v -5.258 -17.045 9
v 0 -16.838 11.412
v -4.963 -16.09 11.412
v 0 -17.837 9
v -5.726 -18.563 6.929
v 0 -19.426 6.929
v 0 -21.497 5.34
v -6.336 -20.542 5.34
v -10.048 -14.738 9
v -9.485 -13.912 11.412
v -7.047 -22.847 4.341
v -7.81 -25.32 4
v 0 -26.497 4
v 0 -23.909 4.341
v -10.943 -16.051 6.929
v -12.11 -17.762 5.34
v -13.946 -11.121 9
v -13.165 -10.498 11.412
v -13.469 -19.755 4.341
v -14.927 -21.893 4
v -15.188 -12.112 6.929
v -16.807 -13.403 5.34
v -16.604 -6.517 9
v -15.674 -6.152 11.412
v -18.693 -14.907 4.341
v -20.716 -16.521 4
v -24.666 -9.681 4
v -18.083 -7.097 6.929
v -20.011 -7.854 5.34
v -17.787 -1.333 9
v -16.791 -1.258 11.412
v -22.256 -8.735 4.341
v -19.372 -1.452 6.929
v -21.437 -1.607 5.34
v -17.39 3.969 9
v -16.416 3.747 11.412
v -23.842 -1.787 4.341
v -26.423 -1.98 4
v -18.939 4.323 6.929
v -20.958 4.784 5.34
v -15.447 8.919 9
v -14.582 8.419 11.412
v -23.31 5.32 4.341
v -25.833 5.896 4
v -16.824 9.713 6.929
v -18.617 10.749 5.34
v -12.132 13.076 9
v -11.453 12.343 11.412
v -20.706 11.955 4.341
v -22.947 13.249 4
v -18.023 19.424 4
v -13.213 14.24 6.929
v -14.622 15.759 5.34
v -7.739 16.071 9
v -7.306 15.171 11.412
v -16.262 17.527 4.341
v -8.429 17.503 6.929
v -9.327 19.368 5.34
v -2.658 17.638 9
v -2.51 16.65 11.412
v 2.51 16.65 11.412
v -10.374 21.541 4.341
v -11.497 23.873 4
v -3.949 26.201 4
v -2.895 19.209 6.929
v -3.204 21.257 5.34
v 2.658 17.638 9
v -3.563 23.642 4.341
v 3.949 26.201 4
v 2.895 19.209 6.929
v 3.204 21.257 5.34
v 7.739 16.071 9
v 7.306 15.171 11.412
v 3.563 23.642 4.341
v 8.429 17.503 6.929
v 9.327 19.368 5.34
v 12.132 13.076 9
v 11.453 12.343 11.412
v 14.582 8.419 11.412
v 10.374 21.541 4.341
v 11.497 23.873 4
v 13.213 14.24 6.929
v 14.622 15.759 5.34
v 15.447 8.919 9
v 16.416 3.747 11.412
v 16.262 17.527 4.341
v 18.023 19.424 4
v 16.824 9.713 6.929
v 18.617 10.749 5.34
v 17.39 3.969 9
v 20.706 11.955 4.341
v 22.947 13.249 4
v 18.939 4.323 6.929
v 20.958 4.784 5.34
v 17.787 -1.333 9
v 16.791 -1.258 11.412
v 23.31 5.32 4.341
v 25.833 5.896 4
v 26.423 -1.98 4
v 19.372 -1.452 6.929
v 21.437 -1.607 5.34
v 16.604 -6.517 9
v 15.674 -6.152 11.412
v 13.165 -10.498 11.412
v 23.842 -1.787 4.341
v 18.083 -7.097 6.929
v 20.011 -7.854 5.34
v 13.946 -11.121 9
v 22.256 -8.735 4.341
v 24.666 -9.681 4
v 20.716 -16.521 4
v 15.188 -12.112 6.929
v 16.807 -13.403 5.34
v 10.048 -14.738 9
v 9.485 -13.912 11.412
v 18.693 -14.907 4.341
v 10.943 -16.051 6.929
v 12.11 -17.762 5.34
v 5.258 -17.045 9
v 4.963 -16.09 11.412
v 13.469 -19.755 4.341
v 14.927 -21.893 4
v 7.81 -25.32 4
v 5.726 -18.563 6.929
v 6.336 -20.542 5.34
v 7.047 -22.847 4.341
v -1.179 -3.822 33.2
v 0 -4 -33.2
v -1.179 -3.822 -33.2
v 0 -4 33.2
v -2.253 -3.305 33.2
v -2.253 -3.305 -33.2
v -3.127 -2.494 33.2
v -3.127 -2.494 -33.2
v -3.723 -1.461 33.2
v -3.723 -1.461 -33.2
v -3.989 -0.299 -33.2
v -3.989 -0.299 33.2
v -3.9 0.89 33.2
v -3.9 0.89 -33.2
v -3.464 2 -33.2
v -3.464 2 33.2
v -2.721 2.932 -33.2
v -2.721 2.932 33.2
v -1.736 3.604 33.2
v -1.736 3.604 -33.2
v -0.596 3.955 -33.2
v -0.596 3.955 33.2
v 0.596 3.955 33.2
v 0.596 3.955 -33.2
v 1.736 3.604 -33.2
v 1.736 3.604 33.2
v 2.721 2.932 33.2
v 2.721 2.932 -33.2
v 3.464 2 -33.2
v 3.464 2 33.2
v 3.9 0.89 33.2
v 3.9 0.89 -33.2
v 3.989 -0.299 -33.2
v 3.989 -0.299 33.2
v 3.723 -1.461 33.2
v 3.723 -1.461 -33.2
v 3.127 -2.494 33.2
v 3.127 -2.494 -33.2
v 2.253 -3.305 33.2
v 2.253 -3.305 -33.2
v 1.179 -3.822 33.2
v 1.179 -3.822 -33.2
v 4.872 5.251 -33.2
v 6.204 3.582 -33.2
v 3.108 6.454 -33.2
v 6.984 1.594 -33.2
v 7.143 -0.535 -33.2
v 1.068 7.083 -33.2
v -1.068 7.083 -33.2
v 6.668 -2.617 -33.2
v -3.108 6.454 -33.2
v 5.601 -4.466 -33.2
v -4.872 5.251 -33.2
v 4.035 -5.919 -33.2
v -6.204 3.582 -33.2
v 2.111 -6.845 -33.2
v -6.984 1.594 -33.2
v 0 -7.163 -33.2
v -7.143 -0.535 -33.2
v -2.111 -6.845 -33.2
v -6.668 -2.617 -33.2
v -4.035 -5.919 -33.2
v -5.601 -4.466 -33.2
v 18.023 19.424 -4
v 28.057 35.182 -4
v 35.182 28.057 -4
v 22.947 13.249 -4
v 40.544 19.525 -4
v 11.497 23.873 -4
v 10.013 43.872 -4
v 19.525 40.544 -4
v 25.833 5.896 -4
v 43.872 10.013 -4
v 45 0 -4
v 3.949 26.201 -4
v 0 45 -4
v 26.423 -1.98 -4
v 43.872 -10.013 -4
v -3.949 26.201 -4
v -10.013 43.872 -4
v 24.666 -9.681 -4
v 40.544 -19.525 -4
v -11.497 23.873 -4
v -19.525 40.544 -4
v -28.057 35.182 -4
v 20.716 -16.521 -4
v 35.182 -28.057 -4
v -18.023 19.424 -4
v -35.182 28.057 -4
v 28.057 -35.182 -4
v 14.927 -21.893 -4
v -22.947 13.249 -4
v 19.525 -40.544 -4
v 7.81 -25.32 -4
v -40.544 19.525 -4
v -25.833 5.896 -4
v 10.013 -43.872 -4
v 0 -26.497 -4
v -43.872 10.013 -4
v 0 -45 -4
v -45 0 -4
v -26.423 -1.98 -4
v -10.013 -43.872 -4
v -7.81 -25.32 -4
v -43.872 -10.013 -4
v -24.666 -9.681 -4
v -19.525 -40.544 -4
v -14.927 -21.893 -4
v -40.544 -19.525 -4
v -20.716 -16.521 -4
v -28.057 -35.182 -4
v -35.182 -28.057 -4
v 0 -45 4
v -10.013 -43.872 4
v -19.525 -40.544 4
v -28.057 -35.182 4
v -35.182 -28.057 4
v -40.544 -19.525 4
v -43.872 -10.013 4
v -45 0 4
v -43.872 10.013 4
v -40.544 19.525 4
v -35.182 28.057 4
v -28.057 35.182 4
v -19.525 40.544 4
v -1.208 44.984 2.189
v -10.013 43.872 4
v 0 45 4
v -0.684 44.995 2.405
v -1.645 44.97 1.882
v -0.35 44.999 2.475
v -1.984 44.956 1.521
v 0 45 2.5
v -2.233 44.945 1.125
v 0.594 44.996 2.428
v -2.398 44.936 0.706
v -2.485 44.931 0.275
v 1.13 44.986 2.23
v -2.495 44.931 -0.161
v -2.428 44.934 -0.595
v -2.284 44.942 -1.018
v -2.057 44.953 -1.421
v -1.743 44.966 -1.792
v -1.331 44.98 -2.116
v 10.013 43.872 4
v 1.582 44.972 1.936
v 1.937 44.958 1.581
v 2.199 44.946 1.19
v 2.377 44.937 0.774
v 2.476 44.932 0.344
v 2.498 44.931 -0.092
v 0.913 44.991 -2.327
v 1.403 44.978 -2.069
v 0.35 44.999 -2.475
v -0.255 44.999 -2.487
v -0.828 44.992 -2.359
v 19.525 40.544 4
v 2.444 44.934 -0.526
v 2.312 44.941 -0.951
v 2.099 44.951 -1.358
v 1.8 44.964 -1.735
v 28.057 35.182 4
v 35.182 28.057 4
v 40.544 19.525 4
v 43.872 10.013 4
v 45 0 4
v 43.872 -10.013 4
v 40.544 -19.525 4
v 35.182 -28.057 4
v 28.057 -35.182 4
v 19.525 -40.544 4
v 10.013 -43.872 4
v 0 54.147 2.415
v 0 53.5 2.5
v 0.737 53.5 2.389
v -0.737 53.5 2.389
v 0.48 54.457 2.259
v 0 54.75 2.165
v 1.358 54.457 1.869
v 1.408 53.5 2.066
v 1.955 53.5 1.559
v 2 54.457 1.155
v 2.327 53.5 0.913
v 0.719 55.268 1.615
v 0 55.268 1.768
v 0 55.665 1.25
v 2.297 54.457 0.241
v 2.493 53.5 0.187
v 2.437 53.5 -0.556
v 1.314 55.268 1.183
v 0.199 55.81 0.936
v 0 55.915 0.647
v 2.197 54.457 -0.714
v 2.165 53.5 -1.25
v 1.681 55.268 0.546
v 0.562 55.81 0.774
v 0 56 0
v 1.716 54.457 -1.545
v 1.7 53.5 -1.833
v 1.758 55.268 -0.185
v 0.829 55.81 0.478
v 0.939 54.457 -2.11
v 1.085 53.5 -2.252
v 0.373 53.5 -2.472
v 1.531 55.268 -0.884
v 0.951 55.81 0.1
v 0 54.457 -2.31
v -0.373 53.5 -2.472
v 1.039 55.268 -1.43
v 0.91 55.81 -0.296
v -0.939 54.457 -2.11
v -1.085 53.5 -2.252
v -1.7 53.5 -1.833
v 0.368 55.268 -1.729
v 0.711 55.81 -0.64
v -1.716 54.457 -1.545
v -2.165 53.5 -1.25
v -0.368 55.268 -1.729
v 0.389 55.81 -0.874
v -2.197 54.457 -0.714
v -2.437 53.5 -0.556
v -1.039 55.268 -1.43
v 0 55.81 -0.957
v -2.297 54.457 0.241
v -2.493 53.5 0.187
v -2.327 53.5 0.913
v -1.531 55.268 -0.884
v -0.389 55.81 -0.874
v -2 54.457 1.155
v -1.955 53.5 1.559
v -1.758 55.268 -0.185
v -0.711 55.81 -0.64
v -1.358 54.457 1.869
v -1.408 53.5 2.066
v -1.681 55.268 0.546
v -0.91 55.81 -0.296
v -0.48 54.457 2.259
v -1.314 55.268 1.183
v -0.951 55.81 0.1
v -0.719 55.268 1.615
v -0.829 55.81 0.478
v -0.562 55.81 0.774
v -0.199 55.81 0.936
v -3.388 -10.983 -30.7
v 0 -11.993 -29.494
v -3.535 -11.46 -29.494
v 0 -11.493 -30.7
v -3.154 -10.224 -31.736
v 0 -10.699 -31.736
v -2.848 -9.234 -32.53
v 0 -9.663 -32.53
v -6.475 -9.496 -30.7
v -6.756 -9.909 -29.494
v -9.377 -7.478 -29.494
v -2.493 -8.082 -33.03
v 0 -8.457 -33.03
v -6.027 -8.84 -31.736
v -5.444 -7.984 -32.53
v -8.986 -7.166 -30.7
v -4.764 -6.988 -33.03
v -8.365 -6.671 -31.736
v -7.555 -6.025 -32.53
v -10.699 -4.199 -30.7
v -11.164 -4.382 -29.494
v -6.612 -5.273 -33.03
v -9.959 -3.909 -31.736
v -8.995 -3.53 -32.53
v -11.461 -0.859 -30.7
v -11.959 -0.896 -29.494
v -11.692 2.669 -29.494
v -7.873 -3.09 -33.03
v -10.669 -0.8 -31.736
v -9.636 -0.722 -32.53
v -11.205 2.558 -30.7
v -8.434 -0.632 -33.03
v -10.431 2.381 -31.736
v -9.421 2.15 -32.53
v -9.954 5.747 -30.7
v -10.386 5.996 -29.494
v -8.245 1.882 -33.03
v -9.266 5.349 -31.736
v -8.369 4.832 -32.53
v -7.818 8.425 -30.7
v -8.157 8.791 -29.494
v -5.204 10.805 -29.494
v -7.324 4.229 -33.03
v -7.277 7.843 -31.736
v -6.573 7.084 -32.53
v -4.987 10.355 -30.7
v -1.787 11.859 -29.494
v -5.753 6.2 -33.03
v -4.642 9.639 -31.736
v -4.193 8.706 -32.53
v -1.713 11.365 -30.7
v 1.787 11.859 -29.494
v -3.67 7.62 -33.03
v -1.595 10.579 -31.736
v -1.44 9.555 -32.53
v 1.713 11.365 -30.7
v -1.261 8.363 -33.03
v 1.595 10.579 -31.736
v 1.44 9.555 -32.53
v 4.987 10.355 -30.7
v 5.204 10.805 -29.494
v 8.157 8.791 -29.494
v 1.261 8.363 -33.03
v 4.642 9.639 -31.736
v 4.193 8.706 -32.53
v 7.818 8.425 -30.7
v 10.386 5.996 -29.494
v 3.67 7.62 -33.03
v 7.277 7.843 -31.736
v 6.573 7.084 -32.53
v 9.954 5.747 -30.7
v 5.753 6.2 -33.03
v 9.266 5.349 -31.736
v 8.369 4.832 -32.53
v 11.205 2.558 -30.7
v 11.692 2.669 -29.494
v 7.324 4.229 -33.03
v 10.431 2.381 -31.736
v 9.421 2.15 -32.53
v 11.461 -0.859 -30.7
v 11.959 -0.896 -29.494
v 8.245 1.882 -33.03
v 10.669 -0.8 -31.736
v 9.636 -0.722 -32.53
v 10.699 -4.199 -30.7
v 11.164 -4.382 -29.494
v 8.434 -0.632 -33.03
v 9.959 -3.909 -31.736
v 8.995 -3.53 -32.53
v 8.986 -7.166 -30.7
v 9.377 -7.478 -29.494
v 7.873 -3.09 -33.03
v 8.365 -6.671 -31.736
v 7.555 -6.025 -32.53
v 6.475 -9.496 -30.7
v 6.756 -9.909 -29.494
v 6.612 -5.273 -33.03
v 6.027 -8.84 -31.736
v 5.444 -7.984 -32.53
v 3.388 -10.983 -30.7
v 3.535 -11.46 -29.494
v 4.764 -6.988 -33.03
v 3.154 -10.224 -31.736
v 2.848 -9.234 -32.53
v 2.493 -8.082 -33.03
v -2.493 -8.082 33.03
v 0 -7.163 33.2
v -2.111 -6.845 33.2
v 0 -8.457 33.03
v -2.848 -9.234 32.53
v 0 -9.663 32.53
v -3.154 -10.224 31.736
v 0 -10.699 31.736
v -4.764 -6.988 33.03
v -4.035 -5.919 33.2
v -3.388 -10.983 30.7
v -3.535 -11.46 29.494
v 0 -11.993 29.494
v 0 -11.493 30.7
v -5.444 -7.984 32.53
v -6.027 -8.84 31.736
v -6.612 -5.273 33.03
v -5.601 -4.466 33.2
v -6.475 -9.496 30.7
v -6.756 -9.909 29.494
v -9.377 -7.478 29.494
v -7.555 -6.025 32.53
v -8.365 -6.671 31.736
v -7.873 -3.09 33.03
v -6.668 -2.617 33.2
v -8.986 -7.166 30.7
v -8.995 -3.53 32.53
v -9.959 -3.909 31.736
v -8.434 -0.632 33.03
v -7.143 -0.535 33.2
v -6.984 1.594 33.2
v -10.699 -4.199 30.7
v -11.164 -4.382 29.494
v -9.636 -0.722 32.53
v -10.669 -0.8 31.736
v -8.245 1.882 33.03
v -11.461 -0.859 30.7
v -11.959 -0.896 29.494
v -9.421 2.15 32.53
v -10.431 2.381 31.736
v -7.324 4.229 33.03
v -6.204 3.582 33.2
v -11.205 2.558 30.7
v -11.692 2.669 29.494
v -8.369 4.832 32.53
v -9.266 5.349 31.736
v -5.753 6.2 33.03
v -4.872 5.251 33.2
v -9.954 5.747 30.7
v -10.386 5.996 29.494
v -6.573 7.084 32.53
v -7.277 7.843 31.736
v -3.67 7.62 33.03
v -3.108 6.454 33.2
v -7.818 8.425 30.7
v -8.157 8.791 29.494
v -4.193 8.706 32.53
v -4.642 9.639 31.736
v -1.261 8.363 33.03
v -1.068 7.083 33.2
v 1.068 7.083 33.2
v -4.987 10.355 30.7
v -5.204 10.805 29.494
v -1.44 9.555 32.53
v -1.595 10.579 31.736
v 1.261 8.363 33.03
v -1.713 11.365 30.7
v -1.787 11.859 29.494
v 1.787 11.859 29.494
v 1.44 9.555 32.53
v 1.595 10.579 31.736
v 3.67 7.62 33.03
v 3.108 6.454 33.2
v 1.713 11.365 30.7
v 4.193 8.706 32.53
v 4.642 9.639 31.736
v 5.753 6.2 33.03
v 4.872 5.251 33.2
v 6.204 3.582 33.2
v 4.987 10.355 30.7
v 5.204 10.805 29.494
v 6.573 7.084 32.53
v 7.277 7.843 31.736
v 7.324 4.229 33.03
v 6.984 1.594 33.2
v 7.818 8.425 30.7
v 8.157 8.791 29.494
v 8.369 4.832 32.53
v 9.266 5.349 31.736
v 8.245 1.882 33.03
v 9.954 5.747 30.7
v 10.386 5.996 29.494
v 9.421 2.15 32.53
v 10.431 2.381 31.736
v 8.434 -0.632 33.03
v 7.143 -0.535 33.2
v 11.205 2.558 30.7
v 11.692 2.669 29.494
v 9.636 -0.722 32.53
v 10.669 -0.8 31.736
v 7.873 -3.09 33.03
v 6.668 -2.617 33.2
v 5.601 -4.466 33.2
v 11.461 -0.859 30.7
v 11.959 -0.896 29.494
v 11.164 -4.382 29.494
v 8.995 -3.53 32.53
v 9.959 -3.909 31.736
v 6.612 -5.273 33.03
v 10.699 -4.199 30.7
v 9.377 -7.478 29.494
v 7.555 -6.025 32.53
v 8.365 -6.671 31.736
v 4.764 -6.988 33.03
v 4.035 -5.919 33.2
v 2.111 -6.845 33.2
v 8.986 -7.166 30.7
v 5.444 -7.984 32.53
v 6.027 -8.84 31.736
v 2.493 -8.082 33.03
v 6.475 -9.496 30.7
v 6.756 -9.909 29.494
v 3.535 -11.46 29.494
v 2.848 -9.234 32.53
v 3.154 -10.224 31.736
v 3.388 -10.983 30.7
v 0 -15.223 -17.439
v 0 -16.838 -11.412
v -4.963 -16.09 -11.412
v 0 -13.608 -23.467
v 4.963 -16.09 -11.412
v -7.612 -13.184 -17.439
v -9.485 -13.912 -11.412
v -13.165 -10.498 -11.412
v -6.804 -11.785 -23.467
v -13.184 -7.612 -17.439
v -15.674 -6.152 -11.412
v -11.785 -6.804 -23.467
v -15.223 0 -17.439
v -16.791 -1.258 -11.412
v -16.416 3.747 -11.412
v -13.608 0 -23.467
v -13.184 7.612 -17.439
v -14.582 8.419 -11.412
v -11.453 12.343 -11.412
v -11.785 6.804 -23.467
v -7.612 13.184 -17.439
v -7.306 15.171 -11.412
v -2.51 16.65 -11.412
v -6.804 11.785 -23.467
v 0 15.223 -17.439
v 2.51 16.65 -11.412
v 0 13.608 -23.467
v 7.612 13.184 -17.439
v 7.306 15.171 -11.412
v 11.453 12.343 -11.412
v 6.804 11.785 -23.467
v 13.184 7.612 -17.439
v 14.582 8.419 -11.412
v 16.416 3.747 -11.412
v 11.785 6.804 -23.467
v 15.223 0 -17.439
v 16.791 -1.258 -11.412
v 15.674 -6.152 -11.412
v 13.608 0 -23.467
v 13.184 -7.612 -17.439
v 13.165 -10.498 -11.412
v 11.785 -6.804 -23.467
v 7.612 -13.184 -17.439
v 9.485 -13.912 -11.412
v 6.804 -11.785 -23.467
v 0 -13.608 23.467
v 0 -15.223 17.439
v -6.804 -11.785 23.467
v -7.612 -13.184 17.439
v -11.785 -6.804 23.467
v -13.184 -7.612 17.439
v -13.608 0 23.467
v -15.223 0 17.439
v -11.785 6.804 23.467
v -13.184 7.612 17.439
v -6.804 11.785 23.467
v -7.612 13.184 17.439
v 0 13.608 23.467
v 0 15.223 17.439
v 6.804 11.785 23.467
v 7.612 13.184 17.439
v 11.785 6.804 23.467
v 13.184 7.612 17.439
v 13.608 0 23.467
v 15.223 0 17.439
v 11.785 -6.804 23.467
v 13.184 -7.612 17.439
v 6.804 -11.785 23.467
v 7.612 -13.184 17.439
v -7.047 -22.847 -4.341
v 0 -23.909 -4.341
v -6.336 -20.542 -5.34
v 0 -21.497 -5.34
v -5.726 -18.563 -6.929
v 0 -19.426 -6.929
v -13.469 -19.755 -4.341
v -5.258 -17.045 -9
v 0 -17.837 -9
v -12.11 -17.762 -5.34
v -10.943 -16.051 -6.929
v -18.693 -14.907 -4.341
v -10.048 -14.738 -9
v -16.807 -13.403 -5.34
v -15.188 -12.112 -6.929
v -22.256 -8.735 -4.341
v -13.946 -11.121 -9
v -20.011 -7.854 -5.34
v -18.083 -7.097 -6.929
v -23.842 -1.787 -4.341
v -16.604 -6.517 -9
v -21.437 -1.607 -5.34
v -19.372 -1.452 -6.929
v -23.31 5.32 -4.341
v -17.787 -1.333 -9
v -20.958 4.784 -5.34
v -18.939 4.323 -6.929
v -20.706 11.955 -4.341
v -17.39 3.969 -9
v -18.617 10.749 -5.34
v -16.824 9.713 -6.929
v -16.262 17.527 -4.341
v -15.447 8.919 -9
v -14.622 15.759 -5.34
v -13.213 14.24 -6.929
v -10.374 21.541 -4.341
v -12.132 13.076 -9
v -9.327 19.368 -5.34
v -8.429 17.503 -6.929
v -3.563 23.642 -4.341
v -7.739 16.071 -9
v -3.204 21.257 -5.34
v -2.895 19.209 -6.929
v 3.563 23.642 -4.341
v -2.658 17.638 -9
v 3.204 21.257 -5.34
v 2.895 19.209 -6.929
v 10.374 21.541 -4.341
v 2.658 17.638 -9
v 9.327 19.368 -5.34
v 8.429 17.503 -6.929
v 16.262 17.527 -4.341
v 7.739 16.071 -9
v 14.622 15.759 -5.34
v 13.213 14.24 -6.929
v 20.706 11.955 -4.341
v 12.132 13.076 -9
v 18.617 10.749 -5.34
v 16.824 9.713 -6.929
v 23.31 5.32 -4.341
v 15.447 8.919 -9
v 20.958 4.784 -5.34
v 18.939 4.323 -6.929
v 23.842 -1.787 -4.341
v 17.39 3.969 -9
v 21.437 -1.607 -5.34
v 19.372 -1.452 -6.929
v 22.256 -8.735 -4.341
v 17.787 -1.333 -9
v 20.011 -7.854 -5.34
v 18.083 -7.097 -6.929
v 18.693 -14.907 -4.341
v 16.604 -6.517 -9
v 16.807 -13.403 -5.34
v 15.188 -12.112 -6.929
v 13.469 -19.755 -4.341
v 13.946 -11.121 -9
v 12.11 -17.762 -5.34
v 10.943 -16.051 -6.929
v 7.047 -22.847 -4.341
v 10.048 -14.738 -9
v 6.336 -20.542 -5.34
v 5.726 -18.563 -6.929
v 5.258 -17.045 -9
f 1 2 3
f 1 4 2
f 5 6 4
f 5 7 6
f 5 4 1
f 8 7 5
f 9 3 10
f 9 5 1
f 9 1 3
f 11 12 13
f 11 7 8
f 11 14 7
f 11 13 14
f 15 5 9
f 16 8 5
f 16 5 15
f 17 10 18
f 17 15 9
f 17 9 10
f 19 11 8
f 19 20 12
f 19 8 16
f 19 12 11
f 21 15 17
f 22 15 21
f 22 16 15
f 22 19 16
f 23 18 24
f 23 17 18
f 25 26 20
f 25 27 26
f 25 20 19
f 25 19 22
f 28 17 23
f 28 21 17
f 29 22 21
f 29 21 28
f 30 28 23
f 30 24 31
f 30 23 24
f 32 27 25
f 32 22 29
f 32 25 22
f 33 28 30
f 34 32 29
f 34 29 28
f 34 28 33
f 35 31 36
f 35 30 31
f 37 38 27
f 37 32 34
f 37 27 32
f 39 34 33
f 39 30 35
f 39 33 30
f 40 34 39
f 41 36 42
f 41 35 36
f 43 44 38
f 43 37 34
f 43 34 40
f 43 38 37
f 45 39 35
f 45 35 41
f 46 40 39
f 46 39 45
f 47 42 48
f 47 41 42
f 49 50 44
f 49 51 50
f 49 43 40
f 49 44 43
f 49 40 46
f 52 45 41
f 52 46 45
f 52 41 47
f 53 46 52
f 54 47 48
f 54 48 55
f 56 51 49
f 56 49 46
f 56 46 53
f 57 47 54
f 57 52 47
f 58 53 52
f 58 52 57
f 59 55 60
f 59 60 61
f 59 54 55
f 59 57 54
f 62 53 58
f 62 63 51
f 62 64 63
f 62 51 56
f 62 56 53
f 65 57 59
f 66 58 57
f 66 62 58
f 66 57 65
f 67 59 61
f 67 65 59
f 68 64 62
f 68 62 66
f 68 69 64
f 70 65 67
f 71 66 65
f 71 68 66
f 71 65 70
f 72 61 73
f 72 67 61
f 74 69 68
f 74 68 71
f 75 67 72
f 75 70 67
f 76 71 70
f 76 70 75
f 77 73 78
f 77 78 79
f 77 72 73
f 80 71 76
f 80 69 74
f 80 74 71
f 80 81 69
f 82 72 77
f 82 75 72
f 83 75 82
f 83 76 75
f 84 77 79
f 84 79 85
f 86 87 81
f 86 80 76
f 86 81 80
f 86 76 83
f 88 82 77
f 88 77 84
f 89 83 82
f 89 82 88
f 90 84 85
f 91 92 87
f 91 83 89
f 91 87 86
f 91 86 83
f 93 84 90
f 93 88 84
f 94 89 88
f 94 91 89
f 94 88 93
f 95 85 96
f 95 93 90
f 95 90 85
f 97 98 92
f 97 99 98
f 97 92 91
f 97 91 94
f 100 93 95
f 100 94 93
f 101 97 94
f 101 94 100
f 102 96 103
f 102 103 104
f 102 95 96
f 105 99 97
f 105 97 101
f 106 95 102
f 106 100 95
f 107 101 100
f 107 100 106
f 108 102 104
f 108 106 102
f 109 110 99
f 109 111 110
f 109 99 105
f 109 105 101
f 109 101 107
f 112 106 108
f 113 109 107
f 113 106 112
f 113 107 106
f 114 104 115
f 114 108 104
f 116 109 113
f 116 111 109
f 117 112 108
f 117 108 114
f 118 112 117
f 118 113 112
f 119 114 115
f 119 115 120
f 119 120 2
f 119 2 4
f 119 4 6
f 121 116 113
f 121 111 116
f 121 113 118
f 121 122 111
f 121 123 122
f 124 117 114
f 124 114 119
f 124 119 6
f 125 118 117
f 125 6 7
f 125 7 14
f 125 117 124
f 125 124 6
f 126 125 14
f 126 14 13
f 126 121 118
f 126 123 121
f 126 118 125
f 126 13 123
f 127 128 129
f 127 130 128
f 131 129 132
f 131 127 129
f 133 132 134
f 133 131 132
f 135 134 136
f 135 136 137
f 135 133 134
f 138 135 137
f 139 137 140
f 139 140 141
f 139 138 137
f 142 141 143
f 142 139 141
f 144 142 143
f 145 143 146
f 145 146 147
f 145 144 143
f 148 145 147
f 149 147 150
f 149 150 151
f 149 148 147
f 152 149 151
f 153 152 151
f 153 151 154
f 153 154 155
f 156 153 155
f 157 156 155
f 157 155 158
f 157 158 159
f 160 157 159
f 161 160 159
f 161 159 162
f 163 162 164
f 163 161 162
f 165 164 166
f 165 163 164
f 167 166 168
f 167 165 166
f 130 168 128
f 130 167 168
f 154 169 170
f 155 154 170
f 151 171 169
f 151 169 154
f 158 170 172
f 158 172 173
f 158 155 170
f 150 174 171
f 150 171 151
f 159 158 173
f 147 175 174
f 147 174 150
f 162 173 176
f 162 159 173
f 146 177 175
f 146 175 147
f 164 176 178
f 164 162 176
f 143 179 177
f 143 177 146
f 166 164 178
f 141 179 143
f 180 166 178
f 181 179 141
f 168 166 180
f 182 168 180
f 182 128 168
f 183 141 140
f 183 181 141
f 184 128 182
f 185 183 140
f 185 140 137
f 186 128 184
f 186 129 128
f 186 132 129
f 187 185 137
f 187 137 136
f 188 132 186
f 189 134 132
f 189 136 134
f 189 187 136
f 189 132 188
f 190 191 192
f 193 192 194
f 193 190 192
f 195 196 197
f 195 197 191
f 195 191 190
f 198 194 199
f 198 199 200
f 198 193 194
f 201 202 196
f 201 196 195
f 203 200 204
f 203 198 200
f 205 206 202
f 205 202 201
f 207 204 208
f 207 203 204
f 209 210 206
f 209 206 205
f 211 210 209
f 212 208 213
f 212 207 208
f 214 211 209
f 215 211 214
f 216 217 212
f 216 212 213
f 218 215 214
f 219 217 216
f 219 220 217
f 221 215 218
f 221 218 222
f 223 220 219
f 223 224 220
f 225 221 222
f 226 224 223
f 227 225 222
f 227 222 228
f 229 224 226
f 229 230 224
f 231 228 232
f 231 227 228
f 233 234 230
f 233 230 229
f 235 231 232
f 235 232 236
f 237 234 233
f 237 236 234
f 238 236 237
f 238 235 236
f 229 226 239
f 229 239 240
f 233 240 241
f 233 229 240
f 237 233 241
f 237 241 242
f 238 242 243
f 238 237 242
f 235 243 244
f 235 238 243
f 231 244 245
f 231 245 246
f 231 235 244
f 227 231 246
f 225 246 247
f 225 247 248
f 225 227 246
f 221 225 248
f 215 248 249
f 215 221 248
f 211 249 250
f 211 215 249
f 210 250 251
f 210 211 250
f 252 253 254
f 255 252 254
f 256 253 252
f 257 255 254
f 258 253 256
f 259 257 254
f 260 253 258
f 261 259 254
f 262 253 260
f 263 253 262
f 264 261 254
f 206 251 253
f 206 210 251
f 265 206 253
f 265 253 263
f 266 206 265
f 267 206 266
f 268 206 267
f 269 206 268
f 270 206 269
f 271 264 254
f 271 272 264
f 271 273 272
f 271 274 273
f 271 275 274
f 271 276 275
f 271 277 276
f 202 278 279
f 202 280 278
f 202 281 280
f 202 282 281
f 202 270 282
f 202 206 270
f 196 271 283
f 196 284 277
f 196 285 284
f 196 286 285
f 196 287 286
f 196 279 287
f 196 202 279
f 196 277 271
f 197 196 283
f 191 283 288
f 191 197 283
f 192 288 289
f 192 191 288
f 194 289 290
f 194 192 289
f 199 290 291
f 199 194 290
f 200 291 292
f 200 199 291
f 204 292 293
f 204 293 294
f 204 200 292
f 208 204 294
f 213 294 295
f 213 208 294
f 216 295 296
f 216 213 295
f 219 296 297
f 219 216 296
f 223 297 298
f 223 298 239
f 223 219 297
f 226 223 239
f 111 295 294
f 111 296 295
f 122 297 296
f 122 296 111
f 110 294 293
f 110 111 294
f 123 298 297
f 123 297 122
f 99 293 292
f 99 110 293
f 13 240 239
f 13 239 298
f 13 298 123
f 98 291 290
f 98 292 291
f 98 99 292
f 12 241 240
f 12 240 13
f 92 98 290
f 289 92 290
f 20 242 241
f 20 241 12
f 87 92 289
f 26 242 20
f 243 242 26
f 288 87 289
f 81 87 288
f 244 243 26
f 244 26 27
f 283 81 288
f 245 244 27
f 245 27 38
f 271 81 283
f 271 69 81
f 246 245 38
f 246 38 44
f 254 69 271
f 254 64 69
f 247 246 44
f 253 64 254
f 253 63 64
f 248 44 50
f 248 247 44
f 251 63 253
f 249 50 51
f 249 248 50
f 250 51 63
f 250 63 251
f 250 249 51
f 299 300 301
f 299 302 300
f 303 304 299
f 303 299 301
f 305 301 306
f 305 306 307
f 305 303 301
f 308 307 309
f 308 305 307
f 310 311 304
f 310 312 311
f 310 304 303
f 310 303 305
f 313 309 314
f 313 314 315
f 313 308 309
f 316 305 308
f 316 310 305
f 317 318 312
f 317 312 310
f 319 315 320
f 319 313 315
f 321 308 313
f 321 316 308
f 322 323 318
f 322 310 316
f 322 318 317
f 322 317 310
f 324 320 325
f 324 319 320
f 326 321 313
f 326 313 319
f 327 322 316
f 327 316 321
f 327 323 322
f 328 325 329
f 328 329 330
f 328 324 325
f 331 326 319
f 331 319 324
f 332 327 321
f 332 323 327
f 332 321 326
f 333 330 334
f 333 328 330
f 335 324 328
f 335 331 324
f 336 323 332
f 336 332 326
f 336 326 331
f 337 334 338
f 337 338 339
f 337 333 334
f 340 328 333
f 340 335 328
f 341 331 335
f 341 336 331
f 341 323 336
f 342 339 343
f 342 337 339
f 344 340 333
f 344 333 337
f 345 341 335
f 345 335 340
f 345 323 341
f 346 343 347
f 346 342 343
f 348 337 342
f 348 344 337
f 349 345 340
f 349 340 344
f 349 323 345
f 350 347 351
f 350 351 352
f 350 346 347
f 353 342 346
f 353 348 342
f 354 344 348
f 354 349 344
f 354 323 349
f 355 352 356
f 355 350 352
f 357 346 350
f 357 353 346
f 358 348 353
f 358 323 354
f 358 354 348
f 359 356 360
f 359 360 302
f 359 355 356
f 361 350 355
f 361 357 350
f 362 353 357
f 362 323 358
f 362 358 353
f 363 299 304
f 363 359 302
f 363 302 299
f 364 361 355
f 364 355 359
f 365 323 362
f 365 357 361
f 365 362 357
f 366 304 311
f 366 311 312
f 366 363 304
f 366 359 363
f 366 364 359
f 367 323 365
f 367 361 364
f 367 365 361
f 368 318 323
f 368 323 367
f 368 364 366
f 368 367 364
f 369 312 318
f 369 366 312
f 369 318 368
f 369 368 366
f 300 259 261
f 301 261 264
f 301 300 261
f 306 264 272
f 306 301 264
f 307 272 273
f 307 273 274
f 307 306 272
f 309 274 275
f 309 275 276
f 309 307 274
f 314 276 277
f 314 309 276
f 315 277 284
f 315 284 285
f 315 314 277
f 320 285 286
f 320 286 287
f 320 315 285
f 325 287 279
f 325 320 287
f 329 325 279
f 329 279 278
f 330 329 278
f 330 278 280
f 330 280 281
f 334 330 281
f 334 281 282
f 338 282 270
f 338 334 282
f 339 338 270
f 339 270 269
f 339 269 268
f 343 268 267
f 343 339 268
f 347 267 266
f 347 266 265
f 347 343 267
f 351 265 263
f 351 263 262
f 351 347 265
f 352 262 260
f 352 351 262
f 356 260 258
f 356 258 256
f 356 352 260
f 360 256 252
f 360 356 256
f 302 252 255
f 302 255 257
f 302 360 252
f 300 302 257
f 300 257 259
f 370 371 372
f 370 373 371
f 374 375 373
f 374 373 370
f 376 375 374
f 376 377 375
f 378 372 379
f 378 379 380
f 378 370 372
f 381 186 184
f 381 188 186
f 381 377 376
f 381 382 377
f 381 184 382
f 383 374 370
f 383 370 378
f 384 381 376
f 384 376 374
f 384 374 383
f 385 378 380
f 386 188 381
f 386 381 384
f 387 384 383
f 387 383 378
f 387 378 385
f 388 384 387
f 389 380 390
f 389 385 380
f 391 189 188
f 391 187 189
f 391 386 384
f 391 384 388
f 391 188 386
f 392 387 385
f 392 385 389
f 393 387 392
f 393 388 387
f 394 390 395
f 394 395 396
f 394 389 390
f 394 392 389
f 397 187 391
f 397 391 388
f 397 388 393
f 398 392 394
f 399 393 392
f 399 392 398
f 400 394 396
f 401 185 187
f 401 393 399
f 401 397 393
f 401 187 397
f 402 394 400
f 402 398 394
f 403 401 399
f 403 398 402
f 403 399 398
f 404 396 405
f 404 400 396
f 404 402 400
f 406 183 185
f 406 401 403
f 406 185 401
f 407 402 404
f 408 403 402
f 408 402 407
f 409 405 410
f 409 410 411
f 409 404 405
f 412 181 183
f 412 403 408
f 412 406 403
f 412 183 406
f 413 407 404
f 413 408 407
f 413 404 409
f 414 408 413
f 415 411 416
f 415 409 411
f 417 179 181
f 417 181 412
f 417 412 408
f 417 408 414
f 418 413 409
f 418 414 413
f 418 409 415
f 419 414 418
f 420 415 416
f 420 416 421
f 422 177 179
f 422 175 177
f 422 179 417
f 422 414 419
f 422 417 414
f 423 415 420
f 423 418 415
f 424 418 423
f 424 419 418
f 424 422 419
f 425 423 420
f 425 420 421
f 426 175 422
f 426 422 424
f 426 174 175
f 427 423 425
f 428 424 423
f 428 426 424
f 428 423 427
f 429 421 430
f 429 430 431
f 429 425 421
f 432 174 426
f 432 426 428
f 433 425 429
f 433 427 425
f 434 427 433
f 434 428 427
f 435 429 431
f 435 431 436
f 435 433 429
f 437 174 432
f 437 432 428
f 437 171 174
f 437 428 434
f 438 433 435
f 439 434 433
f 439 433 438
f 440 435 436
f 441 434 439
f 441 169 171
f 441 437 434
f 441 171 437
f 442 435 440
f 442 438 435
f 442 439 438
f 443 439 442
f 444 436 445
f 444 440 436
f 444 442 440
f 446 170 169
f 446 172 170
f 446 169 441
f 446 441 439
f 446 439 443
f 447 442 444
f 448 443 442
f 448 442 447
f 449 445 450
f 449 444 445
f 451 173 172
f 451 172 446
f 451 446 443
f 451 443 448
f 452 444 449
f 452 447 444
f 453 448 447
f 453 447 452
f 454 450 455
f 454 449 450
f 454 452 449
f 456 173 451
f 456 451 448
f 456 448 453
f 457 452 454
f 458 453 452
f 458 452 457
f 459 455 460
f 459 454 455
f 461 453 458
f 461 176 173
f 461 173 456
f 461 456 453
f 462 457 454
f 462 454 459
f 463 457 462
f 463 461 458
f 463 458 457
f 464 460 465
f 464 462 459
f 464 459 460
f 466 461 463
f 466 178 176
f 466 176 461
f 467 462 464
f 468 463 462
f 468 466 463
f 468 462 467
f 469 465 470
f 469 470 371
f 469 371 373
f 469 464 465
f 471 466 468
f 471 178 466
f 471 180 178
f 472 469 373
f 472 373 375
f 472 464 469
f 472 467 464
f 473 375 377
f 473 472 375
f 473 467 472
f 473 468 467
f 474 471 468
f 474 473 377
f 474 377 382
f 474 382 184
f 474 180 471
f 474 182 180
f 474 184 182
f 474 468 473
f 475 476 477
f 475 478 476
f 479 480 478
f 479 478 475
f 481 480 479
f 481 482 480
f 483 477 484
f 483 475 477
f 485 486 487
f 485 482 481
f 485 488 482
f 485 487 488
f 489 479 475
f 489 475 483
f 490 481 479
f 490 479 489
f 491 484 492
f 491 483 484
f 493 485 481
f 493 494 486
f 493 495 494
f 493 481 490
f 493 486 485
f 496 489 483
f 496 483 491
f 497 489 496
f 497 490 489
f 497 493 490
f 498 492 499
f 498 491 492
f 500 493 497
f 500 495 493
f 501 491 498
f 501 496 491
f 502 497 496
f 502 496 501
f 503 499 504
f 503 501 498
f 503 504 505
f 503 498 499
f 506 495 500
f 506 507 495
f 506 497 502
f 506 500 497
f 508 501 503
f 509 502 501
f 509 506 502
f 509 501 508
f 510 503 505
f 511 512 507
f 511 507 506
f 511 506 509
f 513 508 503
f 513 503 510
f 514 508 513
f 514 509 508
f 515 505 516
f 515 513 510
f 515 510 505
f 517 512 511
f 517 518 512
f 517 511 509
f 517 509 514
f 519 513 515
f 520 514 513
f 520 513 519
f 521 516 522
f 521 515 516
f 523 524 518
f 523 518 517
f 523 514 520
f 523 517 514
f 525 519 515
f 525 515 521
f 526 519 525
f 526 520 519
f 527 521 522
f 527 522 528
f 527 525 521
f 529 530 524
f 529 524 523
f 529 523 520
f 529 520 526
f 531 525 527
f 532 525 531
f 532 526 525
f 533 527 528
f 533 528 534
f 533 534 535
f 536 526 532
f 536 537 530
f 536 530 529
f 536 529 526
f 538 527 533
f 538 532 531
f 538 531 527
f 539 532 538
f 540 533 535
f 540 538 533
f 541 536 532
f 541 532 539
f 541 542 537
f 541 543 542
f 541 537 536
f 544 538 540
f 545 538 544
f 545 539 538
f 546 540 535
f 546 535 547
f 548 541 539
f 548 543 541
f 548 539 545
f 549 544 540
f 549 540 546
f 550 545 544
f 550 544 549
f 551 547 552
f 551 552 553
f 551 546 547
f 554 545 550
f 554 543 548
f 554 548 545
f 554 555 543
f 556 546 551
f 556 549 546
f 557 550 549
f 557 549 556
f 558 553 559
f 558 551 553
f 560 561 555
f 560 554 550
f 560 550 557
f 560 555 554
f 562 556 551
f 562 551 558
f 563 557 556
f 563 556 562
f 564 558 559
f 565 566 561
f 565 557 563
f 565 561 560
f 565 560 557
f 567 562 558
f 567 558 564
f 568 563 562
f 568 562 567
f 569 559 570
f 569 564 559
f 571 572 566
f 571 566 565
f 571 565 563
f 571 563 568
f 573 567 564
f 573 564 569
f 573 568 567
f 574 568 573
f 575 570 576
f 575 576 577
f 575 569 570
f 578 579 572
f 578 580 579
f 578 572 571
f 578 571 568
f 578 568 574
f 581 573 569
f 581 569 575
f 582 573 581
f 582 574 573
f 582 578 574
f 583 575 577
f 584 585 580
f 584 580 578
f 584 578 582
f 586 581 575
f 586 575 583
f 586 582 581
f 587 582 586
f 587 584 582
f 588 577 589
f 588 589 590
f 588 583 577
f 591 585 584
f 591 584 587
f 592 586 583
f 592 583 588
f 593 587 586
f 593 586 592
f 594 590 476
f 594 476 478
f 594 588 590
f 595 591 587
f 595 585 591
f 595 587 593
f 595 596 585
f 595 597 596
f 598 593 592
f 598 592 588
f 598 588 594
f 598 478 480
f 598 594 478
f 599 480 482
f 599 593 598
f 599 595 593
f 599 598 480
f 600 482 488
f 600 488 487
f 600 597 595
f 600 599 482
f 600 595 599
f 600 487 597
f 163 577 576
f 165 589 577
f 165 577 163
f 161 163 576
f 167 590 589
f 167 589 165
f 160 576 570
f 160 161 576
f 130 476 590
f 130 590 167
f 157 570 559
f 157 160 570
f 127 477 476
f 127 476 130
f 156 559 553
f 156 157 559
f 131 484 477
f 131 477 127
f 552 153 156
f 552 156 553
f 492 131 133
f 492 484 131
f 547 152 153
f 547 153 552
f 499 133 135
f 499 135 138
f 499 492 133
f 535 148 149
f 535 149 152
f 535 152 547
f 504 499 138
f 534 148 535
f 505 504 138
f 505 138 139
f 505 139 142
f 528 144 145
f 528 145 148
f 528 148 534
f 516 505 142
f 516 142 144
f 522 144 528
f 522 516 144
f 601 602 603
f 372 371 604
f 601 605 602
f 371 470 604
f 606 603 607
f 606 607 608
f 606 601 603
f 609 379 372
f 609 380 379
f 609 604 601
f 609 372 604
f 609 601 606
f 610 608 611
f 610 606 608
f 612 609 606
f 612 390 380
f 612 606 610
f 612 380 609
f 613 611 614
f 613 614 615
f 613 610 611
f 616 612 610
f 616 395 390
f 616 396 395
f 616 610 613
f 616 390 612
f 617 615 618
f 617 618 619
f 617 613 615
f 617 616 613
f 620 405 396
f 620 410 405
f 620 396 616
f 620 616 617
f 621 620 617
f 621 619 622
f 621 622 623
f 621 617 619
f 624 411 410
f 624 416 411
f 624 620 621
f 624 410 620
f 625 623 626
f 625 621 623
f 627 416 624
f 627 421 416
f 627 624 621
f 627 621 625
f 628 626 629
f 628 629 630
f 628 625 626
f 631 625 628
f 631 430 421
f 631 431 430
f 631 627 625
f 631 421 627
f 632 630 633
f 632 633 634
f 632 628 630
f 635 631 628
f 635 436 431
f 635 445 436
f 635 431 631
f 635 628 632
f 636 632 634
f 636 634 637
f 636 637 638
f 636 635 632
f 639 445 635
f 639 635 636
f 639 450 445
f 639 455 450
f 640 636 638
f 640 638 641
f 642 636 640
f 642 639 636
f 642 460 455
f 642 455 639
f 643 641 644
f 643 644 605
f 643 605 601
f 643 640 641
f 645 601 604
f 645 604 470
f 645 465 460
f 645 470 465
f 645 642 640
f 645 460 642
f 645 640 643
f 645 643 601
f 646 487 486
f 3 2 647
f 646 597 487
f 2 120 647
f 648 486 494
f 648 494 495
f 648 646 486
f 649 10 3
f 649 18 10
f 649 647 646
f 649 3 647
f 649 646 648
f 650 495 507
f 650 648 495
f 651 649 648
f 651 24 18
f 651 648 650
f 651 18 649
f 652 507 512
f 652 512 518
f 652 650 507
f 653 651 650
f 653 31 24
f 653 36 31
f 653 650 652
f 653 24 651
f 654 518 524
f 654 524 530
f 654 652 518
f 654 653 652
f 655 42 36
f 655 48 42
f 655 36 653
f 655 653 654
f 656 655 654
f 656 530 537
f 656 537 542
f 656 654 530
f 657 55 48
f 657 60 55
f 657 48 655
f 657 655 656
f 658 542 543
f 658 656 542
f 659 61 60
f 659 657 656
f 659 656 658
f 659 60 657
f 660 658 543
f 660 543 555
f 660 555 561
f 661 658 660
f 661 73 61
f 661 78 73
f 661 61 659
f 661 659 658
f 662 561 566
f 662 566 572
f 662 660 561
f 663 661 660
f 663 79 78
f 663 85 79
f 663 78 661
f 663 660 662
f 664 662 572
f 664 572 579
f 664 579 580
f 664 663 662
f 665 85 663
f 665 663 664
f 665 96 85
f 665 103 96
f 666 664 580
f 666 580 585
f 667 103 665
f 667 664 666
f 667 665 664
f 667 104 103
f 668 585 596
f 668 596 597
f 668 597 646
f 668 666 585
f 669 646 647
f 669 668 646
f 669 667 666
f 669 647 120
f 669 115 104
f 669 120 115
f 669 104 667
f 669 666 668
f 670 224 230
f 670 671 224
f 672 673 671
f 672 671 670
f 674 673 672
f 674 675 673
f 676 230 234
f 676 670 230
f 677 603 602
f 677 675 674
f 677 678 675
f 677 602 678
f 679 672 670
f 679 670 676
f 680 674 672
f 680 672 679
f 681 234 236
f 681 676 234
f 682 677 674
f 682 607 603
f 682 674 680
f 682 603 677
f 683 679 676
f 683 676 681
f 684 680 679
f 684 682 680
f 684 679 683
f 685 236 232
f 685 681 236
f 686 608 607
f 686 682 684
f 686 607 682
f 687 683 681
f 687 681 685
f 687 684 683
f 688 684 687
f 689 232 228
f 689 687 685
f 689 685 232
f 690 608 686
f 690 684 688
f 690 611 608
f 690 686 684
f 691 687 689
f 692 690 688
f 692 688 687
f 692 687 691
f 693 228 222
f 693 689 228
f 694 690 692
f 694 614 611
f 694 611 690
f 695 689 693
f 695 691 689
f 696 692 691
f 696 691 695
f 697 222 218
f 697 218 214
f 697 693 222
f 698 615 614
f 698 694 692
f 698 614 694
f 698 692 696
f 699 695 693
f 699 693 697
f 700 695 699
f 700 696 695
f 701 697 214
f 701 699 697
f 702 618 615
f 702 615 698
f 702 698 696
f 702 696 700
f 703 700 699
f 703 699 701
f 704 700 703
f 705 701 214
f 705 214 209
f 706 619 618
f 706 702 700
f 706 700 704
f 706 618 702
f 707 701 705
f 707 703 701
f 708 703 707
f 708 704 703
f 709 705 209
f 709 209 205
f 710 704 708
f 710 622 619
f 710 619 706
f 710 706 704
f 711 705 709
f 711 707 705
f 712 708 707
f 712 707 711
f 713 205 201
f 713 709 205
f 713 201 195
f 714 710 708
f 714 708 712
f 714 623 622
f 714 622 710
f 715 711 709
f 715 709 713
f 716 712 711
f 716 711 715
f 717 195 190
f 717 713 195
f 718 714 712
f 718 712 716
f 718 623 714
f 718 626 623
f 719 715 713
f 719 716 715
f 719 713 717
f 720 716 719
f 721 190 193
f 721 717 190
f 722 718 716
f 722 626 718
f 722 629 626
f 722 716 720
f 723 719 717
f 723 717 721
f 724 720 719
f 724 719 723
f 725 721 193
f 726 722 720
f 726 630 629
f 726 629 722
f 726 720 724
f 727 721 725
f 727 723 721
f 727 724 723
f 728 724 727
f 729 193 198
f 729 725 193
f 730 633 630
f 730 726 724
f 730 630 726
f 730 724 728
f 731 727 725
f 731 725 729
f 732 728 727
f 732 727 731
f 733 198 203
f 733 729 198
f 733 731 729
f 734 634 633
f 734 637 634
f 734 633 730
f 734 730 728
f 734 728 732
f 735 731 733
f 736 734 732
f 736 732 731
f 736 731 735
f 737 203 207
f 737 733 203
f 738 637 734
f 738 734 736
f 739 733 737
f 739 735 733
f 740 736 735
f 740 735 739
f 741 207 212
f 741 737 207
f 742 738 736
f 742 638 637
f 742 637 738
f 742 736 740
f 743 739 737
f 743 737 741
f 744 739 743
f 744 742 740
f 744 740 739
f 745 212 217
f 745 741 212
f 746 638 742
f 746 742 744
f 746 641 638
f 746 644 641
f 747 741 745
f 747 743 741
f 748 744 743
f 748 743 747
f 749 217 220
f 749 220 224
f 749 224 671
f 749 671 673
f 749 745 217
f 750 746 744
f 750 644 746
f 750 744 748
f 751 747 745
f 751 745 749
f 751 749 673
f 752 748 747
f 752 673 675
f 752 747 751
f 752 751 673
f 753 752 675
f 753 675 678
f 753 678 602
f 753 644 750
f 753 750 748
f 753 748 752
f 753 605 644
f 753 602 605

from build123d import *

# Parameters (mm, degrees)
F2_W = 15.708493
F2_H = 2.5
F4_R = 2.5


with BuildPart() as f1:
    # F0 (on Right) → F1 (revolve)
    with BuildSketch(Plane.YZ):
        with BuildLine():
            Line((-45, 4), (-45, 0))
            Line((-45, 0), (-45, -4))
            Line((-45, -4), (-26.497386, -4))
            ThreePointArc((-26.497386, -4), (-20.409772, -6.066467), (-16.838128, -11.41181))
            Line((-16.838128, -11.41181), (-11.992994, -29.494095))
            ThreePointArc((-11.992994, -29.494095), (-10.207172, -32.166767), (-7.163365, -33.2))
            Line((-7.163365, -33.2), (-4, -33.2))
            Line((-4, -33.2), (-4, 33.2))
            Line((-4, 33.2), (-7.163365, 33.2))
            ThreePointArc((-7.163365, 33.2), (-10.207172, 32.166767), (-11.992994, 29.494095))
            Line((-11.992994, 29.494095), (-16.838128, 11.41181))
            ThreePointArc((-16.838128, 11.41181), (-20.409772, 6.066467), (-26.497386, 4))
            Line((-26.497386, 4), (-45, 4))
        make_face()
    revolve(axis=Axis((0, 0, 0.106538), (0, 0, -1)))

    # F2 (on Right) → F3 (revolve)
    with BuildSketch(Plane.YZ):
        with Locations((48.145753, 1.25)):
            Rectangle(F2_W, F2_H)
    revolve(axis=Axis((0, 48.145753, 0), (0, 1, 0)))

    # F4
    f4_edges = [f1.edges().sort_by_distance(p)[0] for p in [
        (0, 56, -2.5),
    ]]
    fillet(f4_edges, radius=F4_R)


solid = f1.part
